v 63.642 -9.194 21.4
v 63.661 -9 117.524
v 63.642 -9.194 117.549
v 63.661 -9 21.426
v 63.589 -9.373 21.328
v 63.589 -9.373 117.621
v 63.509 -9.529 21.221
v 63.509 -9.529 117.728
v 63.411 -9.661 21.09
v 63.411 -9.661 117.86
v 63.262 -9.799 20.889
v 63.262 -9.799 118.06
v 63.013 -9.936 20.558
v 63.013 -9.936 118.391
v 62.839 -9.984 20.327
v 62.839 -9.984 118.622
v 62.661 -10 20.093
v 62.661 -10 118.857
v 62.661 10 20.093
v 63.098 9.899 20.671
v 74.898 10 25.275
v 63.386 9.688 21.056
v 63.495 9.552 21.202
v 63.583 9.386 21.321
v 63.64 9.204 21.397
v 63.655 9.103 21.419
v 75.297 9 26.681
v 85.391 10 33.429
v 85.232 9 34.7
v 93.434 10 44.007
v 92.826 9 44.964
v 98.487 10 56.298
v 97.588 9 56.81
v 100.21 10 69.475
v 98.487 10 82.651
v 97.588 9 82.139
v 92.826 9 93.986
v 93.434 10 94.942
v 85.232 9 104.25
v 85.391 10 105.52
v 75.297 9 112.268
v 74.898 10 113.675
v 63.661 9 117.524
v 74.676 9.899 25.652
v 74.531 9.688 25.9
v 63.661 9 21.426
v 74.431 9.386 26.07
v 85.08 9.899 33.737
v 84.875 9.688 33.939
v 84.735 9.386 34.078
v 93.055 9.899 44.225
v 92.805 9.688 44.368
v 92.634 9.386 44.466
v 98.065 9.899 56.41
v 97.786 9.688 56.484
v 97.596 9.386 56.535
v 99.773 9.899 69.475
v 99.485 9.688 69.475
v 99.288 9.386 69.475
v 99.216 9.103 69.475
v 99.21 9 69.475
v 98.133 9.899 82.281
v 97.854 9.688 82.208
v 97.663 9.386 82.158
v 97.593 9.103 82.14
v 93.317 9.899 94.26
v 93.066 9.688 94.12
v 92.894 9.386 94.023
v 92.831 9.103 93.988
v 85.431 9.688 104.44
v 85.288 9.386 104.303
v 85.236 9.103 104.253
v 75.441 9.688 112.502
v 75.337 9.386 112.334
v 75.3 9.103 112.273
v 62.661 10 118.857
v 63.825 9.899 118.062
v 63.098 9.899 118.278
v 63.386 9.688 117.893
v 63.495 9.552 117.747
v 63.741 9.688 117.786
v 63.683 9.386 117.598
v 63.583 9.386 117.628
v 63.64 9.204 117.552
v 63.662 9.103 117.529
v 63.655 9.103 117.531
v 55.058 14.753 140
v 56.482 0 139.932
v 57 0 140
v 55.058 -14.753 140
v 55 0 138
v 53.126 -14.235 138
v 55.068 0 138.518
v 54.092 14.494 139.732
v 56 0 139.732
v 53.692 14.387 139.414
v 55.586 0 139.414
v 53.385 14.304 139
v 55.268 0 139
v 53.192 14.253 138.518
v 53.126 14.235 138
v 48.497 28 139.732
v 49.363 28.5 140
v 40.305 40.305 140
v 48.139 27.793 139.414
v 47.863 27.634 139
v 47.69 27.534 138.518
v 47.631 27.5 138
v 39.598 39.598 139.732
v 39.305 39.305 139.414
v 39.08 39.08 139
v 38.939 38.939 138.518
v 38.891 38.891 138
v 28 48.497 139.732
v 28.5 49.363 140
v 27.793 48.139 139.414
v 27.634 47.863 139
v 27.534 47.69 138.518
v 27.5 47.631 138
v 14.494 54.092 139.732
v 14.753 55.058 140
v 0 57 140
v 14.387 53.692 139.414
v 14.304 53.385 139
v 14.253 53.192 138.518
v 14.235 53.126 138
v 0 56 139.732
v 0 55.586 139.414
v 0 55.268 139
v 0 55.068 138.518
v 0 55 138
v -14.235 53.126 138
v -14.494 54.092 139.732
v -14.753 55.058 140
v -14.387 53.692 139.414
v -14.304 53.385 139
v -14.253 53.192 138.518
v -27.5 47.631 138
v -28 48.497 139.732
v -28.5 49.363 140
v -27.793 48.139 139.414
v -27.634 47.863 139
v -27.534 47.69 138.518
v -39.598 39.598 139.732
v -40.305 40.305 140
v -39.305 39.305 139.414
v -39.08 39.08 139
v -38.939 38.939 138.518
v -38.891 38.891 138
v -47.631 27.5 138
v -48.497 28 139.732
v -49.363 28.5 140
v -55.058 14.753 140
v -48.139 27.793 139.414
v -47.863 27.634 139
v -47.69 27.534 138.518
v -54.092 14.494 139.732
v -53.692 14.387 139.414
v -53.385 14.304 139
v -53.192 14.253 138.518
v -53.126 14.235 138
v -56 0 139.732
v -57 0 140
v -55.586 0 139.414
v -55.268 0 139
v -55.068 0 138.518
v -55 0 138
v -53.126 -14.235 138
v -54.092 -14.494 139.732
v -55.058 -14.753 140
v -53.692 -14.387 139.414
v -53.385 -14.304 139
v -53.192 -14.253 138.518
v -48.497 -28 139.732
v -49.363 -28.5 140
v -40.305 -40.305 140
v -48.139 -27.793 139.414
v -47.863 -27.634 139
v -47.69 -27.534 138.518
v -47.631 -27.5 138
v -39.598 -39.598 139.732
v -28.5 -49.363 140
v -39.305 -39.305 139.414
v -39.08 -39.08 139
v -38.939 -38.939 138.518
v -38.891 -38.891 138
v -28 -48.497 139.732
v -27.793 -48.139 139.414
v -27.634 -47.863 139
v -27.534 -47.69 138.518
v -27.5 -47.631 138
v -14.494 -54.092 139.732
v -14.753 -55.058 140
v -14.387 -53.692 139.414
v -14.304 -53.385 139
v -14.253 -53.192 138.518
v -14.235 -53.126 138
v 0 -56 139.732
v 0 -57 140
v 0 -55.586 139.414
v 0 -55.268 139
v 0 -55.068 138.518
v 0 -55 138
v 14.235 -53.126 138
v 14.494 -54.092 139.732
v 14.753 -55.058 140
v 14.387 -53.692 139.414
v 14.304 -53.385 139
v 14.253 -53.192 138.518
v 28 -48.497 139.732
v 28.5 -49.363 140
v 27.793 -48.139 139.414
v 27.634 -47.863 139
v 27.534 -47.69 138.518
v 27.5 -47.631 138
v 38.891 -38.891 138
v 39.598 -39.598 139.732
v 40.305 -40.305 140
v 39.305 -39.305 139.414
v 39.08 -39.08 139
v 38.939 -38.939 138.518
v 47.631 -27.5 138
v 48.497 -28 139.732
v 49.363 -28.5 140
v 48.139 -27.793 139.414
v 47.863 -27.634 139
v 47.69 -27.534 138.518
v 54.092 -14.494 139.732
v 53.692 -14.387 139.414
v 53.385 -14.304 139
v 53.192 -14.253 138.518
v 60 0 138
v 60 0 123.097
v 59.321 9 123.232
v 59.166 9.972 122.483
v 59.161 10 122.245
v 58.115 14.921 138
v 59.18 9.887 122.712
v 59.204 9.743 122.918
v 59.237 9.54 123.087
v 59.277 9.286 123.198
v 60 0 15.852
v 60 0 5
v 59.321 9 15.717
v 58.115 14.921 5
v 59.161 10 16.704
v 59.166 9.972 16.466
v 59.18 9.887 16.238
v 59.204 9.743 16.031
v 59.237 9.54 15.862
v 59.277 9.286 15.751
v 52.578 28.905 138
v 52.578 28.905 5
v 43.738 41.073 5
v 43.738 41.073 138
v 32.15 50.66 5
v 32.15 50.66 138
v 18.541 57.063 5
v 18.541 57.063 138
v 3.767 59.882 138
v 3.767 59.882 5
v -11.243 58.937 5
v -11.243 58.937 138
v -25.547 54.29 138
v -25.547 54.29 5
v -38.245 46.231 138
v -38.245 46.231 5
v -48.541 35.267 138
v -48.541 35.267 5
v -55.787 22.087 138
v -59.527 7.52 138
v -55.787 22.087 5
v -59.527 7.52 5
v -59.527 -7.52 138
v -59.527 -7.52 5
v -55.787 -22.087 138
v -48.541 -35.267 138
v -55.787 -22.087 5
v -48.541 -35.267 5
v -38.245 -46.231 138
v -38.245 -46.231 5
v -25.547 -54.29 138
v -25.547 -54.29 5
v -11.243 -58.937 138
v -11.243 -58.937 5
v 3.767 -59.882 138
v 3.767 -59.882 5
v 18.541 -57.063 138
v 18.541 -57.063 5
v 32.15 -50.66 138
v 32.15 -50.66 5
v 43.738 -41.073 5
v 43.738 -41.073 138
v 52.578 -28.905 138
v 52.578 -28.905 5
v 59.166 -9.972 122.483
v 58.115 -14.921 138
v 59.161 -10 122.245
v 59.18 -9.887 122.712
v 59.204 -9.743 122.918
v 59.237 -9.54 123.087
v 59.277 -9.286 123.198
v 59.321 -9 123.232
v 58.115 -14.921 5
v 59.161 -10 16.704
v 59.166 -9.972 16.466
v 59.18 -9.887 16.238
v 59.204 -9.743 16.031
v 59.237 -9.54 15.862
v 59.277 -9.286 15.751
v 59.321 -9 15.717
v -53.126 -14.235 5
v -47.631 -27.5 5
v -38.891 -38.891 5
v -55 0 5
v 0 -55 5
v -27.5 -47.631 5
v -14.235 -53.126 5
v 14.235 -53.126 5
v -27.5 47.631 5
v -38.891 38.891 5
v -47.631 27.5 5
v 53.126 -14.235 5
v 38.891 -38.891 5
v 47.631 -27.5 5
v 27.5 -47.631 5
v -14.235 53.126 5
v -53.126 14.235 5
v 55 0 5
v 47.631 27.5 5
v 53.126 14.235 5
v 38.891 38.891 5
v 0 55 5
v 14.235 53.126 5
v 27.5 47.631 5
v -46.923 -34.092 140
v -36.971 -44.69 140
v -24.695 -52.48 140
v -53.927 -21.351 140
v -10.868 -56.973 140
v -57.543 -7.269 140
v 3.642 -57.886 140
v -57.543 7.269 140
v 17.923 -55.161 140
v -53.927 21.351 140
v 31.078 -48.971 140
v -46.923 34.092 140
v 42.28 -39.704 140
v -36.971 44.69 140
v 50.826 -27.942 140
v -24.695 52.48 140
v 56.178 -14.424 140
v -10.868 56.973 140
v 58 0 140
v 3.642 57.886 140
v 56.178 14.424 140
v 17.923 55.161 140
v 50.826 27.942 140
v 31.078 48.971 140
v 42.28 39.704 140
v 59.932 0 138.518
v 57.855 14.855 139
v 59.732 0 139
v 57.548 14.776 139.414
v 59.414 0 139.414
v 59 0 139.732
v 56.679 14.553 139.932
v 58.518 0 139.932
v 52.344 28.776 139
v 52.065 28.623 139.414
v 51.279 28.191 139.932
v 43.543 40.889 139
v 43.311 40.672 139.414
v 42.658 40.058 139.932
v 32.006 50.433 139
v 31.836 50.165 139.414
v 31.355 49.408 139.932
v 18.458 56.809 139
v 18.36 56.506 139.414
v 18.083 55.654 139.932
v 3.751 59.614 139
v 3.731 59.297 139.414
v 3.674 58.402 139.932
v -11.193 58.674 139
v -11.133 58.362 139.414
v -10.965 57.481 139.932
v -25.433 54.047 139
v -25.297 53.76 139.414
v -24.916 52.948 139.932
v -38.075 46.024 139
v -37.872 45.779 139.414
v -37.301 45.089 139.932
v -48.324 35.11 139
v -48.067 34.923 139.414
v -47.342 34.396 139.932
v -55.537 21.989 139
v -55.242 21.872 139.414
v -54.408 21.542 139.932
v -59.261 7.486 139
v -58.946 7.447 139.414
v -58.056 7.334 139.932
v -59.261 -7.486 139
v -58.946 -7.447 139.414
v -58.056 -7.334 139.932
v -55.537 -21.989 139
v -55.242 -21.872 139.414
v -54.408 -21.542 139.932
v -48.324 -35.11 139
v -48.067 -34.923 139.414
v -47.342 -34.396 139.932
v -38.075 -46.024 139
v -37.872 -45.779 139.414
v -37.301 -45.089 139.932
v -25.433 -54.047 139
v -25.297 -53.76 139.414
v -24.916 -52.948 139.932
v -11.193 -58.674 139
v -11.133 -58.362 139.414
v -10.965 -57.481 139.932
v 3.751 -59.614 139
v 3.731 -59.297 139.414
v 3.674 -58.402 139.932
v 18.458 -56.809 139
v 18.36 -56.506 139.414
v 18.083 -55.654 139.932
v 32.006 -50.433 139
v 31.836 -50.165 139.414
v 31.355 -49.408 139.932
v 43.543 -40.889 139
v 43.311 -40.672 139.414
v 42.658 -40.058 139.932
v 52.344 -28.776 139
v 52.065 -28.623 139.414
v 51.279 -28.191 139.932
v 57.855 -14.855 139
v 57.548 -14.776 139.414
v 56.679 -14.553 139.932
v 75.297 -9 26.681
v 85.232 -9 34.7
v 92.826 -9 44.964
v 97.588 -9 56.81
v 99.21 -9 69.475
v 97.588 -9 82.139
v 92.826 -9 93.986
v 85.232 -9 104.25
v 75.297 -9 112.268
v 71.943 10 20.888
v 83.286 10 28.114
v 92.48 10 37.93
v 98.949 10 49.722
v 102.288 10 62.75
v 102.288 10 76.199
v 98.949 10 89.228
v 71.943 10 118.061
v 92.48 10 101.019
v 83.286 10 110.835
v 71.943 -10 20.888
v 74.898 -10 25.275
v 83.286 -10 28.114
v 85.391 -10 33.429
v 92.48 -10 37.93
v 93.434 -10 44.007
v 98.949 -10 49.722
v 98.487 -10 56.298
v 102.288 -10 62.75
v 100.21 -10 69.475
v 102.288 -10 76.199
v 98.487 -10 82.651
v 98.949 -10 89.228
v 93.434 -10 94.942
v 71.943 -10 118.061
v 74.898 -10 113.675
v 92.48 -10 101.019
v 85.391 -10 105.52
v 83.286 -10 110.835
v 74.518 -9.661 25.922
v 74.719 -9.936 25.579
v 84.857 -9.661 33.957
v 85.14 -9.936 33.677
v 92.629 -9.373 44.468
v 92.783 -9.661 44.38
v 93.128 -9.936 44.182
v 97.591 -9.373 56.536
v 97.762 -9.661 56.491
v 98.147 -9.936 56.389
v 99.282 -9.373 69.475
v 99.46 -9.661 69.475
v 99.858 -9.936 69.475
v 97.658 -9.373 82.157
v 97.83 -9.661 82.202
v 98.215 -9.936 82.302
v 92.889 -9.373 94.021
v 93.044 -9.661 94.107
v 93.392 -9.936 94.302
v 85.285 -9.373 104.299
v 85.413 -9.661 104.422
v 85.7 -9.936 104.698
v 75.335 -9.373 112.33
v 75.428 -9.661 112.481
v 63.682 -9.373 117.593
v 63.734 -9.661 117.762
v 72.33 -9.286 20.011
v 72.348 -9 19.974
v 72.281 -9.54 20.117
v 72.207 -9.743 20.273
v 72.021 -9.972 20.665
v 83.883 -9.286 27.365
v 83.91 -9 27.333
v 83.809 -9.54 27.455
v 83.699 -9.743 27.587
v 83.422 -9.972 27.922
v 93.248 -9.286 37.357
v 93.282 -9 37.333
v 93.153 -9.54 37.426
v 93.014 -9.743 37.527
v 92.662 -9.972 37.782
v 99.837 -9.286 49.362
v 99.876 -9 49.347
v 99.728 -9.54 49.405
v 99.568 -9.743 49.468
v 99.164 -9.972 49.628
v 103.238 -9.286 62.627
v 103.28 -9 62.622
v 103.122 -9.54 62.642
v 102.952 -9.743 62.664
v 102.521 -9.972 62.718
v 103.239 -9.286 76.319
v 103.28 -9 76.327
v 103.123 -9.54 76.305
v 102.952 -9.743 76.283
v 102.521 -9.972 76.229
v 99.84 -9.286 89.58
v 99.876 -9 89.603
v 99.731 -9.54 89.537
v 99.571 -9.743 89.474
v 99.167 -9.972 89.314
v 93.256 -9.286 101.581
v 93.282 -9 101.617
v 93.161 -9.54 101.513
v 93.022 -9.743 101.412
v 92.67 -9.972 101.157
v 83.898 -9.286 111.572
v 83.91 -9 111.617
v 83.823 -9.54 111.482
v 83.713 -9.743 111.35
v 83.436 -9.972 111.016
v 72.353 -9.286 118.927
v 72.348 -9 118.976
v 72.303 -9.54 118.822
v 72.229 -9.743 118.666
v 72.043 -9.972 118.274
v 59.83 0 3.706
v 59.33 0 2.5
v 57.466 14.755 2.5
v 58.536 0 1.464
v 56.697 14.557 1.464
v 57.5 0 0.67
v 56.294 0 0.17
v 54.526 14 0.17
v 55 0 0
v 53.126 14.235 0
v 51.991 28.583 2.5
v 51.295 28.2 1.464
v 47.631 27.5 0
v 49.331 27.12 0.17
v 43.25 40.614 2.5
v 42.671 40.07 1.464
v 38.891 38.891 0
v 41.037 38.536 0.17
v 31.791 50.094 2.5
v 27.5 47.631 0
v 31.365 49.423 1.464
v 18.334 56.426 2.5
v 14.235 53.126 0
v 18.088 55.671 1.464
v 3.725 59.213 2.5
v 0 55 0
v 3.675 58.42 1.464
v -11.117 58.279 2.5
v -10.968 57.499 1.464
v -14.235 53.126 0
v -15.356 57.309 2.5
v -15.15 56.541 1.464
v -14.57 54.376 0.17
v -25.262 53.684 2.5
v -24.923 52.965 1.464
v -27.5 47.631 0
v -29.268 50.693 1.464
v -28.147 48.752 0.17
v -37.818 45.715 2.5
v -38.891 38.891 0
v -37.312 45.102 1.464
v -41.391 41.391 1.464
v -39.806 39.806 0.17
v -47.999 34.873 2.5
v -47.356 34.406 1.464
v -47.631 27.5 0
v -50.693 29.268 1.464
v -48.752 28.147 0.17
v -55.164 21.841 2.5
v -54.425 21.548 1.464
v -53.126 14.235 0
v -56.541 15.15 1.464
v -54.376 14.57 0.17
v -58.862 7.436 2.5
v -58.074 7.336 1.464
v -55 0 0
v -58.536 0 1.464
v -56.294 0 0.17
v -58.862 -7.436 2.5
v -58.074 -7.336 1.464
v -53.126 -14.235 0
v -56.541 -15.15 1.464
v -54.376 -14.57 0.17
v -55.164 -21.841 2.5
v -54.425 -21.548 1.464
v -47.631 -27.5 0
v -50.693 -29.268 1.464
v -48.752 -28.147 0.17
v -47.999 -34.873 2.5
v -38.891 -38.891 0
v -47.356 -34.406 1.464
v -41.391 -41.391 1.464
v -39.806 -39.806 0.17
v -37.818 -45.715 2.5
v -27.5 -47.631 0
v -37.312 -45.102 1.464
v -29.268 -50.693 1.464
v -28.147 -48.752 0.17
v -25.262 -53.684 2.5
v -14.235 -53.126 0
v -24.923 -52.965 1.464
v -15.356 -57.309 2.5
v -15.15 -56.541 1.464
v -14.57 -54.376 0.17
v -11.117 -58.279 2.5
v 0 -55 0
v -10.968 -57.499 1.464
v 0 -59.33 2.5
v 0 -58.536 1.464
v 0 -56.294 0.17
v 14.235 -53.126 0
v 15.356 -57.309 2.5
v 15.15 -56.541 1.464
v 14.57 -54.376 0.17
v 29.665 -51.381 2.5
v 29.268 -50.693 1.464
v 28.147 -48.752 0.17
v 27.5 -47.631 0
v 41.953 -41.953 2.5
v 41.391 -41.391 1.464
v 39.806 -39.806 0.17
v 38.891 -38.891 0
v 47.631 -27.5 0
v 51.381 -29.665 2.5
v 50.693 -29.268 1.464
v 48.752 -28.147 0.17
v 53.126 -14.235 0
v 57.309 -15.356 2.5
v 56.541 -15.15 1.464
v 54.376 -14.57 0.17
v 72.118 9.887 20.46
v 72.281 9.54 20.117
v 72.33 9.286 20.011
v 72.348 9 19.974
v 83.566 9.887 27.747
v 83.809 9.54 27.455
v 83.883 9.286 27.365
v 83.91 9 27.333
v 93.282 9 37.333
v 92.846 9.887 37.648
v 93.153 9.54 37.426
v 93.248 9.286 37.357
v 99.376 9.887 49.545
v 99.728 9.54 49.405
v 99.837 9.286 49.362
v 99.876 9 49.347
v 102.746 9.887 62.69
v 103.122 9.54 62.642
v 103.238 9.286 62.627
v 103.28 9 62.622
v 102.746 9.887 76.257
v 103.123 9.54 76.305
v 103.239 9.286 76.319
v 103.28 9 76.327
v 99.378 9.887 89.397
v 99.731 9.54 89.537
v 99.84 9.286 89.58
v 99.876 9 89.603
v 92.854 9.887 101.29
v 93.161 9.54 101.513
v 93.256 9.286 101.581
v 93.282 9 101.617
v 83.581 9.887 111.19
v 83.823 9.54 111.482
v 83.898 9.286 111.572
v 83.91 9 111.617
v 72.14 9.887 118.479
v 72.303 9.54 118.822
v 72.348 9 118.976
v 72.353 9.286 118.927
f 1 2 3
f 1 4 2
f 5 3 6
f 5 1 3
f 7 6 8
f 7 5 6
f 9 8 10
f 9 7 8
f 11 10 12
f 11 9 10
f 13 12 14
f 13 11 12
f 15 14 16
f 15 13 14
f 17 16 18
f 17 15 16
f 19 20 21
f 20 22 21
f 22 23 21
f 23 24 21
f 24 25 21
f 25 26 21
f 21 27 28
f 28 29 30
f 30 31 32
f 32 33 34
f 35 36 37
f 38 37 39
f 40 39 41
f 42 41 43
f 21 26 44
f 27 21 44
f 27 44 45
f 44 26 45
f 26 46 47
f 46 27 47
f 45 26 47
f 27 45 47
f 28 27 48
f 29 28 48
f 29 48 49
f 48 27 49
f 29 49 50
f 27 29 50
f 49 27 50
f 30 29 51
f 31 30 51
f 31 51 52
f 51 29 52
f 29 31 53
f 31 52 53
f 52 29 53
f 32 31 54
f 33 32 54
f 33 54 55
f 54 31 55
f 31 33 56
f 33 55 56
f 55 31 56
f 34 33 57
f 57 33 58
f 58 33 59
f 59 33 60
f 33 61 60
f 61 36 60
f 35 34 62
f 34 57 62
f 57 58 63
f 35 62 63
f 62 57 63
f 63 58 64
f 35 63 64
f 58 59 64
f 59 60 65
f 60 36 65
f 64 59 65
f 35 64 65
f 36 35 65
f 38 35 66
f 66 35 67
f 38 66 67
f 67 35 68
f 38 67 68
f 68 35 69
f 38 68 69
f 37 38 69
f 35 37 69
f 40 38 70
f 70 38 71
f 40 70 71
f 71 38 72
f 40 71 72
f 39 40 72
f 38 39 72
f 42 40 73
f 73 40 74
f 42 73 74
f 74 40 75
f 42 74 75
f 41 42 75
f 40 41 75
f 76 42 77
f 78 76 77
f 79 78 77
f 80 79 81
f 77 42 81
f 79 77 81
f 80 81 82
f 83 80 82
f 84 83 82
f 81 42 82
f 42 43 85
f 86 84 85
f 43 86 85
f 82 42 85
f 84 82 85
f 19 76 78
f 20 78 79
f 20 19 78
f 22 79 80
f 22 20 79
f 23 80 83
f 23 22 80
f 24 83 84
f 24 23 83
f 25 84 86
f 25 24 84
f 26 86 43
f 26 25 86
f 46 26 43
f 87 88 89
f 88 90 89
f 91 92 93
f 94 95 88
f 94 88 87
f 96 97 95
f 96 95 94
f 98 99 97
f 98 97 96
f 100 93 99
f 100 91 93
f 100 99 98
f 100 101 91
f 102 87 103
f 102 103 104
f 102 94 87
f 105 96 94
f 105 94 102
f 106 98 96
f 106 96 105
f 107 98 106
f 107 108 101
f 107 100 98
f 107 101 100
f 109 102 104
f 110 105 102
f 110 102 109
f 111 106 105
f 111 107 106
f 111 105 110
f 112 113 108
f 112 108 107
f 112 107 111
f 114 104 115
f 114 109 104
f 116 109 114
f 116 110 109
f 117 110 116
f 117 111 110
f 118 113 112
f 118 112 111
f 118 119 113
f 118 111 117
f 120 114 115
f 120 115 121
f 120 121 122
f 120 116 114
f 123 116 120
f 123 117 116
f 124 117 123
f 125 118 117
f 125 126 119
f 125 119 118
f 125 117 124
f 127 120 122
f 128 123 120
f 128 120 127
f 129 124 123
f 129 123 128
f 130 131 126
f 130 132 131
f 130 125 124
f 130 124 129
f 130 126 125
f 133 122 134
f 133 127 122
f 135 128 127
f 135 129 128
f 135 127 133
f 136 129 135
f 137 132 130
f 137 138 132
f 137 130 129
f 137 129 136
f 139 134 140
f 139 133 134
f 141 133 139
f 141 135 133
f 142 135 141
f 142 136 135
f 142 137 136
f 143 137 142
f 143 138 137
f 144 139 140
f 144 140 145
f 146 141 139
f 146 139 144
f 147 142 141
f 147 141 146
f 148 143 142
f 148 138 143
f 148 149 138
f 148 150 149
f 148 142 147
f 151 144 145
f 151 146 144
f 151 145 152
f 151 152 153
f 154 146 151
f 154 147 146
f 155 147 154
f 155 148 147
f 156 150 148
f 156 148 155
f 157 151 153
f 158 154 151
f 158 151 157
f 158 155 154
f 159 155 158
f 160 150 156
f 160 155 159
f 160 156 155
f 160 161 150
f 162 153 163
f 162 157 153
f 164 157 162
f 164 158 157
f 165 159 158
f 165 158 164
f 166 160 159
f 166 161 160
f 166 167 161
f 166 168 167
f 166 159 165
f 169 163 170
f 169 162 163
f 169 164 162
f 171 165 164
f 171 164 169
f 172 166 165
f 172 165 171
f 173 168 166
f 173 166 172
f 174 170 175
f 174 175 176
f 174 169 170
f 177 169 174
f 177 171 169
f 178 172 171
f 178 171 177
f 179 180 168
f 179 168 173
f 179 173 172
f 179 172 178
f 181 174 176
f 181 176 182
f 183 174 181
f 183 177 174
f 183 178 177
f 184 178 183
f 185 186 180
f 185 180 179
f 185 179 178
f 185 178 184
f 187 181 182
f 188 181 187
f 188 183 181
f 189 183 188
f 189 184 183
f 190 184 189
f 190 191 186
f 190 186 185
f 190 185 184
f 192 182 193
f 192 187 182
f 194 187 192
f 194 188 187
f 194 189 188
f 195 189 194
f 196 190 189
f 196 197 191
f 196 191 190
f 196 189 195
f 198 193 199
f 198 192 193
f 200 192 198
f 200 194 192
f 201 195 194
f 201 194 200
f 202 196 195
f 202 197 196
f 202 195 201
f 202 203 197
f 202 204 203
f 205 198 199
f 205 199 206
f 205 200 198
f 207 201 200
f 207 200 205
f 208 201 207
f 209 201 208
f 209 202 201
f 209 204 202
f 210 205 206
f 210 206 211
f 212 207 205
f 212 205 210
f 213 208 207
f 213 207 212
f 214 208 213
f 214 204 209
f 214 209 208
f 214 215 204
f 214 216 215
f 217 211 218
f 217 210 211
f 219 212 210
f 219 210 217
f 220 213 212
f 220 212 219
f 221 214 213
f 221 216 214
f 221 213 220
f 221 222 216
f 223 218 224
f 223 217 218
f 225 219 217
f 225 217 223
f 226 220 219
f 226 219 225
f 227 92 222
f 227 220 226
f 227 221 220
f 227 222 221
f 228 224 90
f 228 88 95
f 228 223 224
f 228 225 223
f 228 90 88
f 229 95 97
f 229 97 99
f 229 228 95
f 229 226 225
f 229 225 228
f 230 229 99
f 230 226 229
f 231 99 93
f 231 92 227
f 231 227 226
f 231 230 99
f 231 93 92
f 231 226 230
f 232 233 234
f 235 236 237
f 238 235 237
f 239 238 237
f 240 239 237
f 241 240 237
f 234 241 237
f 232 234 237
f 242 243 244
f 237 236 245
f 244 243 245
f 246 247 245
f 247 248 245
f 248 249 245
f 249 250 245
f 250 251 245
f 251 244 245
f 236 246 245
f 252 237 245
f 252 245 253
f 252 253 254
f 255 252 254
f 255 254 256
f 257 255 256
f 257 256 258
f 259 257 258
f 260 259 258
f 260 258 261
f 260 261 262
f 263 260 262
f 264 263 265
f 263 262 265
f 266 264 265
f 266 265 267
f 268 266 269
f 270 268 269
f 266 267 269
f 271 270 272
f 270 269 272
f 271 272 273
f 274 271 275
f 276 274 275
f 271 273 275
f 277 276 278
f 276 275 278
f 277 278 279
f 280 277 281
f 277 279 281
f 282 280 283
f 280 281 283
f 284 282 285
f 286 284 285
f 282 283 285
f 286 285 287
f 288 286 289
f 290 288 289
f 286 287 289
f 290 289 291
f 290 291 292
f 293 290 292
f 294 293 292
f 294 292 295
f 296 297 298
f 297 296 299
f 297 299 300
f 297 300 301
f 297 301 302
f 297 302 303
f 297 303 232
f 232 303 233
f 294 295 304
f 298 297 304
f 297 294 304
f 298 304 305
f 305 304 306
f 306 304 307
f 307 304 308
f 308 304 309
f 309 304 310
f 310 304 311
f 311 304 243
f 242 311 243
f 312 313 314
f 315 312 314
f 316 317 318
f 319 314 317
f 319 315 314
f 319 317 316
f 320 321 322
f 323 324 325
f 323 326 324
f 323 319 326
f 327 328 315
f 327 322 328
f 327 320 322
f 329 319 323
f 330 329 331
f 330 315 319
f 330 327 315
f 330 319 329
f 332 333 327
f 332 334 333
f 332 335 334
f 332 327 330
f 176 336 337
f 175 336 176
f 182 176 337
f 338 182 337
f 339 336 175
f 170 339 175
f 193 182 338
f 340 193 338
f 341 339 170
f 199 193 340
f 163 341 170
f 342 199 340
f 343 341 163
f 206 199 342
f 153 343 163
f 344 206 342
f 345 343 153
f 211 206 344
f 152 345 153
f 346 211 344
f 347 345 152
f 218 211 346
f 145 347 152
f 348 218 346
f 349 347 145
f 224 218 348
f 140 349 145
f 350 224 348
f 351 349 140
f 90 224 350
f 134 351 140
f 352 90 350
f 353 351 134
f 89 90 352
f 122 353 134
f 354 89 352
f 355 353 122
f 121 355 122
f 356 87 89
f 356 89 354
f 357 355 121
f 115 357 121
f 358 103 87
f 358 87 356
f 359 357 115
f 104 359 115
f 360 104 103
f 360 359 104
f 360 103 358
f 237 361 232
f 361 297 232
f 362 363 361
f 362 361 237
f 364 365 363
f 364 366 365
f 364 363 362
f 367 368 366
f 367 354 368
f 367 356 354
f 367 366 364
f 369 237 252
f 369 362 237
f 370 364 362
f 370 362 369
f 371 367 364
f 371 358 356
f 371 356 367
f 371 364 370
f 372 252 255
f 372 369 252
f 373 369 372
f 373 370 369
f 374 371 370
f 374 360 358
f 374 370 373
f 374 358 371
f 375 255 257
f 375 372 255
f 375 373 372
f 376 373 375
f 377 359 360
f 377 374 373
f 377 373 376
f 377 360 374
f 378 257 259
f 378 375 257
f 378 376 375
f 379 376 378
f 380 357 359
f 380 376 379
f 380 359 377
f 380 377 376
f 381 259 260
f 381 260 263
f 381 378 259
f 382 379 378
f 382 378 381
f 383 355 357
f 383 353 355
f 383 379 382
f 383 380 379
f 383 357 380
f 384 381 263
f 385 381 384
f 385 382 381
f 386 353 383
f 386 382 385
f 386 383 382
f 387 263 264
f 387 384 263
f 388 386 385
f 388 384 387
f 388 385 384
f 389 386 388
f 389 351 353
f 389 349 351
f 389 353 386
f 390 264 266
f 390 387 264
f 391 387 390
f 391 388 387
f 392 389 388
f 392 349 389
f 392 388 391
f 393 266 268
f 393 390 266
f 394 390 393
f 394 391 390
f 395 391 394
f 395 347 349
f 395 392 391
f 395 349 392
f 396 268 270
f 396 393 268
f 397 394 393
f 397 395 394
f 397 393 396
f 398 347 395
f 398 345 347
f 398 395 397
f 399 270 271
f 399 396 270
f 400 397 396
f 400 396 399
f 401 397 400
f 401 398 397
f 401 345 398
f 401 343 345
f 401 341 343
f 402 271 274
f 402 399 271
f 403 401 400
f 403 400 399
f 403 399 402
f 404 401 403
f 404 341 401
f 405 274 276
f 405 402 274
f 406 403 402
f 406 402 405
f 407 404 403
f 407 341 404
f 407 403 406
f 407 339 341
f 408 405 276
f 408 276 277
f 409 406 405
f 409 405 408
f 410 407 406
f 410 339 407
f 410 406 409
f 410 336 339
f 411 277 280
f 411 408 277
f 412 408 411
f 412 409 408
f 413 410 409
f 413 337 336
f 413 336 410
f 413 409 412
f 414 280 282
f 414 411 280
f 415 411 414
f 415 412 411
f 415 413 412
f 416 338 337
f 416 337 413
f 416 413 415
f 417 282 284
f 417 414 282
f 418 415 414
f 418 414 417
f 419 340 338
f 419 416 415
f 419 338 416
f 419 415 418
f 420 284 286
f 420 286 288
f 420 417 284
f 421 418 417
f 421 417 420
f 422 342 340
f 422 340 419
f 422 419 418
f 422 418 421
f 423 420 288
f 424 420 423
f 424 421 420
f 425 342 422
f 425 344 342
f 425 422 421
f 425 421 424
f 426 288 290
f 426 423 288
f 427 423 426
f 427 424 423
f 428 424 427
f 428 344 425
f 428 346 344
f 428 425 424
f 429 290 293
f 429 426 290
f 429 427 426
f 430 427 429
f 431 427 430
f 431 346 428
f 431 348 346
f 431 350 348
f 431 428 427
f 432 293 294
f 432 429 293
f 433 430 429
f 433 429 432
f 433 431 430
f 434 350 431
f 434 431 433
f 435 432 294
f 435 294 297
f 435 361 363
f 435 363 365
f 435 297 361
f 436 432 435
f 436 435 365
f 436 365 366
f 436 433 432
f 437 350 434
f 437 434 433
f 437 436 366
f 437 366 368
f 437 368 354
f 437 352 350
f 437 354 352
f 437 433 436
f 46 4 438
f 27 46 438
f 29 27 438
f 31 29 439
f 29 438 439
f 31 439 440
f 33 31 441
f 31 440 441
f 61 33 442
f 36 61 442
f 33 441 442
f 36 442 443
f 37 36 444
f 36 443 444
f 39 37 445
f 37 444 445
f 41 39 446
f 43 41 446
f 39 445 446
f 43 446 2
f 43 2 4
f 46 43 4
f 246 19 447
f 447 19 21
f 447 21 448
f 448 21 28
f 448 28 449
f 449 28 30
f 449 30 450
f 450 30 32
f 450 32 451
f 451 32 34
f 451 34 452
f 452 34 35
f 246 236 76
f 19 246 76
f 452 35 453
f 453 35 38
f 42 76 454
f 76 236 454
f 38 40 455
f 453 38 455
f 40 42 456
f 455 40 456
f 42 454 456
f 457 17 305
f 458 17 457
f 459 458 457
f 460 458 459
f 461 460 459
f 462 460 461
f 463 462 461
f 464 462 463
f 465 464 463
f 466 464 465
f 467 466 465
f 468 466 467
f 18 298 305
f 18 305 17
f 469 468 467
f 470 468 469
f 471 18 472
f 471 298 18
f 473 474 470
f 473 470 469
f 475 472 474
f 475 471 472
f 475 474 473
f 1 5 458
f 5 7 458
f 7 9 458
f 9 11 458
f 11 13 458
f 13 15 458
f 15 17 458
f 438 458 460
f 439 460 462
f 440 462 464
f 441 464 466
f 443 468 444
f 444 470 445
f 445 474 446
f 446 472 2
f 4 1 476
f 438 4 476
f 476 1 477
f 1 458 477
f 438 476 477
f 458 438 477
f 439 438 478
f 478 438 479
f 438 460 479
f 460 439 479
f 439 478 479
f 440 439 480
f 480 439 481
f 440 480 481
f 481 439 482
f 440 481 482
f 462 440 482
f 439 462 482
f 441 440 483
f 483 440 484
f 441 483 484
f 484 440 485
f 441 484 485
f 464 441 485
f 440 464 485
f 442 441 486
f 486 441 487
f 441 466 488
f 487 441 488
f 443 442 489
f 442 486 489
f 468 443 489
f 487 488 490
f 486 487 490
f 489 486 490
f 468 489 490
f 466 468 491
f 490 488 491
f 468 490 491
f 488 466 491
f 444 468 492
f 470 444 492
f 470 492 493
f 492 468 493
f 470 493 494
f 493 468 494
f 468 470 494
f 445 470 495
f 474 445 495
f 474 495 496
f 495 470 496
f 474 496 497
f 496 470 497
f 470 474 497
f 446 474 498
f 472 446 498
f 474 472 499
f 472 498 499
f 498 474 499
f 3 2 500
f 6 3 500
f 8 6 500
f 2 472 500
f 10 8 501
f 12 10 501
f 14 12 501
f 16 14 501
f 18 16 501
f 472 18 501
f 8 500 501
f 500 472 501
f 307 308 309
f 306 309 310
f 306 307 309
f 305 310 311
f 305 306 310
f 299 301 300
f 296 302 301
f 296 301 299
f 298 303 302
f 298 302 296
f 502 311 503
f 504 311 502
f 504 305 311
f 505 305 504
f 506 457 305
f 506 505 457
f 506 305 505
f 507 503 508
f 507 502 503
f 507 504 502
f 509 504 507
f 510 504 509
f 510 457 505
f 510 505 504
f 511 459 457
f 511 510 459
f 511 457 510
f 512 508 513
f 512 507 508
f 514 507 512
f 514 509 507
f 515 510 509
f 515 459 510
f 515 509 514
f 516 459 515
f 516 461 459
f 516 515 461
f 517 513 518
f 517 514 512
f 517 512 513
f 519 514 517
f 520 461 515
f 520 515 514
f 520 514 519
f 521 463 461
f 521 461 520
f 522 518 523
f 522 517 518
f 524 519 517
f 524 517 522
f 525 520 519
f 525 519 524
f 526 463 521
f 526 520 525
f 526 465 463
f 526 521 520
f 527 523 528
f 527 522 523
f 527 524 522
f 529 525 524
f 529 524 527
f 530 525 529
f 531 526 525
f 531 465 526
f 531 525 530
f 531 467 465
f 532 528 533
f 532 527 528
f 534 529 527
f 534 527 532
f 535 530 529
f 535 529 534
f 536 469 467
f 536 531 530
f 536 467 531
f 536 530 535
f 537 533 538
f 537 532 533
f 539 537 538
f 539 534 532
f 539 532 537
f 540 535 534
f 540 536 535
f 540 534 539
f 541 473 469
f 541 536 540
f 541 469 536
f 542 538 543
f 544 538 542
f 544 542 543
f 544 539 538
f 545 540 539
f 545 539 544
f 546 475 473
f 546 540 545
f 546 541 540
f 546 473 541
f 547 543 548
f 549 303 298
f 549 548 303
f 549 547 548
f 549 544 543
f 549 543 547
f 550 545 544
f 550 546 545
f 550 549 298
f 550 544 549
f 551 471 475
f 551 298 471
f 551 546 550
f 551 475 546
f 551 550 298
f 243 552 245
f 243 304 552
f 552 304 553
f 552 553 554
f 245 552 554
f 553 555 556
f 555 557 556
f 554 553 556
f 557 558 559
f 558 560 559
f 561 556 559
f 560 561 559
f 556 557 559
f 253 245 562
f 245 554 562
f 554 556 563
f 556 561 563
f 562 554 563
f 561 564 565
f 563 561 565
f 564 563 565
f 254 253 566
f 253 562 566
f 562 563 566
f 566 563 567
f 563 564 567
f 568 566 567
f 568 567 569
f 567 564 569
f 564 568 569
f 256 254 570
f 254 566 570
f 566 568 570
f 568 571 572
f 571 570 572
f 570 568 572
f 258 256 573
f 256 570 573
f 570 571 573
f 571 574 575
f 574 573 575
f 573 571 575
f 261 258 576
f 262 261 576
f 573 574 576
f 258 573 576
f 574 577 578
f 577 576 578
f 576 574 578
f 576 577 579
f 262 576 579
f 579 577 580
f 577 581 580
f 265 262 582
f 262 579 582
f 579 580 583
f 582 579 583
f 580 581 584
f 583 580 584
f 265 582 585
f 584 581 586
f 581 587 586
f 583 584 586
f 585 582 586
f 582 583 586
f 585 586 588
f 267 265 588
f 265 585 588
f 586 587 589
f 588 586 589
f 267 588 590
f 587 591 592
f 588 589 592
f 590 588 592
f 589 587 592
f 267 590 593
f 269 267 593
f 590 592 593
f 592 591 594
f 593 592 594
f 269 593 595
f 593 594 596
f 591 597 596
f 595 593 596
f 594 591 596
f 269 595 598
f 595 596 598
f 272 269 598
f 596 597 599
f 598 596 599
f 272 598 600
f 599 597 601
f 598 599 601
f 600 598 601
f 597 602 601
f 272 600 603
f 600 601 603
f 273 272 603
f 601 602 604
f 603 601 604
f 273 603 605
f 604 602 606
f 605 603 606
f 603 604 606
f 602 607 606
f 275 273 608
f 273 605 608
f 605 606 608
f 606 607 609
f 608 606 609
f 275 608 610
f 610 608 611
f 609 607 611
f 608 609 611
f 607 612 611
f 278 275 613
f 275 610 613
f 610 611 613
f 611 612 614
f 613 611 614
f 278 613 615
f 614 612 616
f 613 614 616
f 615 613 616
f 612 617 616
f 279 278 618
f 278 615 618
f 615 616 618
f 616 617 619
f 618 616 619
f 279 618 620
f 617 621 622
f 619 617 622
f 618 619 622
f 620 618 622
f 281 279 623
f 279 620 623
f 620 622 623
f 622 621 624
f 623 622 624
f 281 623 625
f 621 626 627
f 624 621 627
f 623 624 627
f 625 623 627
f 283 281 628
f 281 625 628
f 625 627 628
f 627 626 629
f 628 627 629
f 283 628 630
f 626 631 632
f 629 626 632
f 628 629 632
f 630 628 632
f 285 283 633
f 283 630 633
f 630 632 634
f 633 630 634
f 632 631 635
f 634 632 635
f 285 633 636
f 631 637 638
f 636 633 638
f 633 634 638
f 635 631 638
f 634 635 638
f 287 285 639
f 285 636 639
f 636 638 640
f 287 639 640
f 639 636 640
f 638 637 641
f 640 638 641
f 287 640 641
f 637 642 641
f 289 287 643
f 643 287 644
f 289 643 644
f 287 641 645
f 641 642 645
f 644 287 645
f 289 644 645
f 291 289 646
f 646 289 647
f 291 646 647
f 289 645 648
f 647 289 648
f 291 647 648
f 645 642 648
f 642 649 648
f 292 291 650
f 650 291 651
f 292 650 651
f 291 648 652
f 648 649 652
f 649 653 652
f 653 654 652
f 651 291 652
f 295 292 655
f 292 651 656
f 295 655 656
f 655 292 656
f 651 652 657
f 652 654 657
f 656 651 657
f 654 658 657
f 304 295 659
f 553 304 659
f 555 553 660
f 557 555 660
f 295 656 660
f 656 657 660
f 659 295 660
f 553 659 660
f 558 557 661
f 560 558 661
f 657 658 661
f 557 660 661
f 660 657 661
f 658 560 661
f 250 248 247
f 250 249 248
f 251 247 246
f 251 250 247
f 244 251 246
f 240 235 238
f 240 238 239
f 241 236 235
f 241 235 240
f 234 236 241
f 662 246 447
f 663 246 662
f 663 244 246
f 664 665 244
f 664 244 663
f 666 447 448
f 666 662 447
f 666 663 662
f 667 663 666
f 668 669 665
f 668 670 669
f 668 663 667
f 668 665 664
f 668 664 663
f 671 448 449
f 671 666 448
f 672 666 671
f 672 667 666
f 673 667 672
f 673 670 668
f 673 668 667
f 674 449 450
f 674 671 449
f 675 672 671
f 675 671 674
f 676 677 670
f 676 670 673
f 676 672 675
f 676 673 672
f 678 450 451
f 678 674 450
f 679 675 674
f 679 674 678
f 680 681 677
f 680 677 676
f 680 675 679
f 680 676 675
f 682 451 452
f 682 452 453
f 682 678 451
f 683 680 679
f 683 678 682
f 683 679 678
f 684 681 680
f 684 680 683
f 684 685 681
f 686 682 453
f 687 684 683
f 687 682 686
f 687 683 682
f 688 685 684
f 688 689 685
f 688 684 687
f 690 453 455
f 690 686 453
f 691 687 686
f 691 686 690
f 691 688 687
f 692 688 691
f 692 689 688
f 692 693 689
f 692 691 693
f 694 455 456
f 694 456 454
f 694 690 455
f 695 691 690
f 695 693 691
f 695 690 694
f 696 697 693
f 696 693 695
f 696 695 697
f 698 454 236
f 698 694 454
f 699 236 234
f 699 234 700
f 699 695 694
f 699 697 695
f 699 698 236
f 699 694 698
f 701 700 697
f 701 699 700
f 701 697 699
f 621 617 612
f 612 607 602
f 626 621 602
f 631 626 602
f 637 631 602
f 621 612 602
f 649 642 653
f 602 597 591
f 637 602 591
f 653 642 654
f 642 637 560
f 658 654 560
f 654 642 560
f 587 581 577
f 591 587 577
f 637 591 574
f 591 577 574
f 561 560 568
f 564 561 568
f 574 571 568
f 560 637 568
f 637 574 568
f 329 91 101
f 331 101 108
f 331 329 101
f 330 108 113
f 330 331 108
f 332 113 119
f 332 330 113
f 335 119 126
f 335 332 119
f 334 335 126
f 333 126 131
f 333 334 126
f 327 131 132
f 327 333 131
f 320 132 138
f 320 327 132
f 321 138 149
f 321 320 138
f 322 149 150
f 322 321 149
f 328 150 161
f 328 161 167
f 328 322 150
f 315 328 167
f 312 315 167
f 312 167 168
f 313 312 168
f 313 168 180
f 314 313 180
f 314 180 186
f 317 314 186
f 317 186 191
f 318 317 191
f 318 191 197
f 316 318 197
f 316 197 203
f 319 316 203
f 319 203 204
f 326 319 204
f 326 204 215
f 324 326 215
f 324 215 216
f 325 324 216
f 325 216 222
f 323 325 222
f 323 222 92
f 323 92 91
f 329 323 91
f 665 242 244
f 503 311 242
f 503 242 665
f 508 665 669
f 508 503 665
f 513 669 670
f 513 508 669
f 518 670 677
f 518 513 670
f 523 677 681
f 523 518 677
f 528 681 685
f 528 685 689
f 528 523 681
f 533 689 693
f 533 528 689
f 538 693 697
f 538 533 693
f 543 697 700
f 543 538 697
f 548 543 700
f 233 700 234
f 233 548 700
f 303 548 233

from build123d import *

# Parameters (mm, degrees)
F0_R     = 60
F1_DEPTH = 140
F2_T     = -5
F3_R     = 2
F5_DEPTH = 10
F7_DEPTH = 54
F8_R     = 1
F9_R     = 5


with BuildPart() as f1:
    # F0 (on Top) → F1 (new body)
    with BuildSketch(Plane.XY):
        Circle(F0_R)
    extrude(amount=F1_DEPTH)

    # F2
    f2_openings = [f1.faces().sort_by_distance(p)[0] for p in [
        (0, 0, 140),
    ]]
    offset(amount=F2_T, openings=f2_openings)

    # F3
    f3_edges = [f1.edges().sort_by_distance(p)[0] for p in [
        (-55, 0, 140),
        (-60, 0, 140),
    ]]
    fillet(f3_edges, radius=F3_R)

    # F4 (on Front) → F5 (join, symmetric)
    with BuildSketch(Plane.XZ):
        with BuildLine():
            Line((57.7629804611, 123.5093176365), (57.7629804611, 15.4400020838))
            ThreePointArc((57.7629804611, 15.4400020838), (103.710291096, 69.4746598601), (57.7629804611, 123.5093176365))
        make_face()
    extrude(amount=F5_DEPTH, both=True)

    # F6 (on face) → F7 (cut)
    with BuildSketch(Plane.XZ.offset(10)):
        with BuildLine():
            Line((63.660797831, 117.5236095815), (63.660797831, 21.4257101387))
            ThreePointArc((63.660797831, 21.4257101387), (99.210291096, 69.4746598601), (63.660797831, 117.5236095815))
        make_face()
    extrude(amount=-F7_DEPTH, mode=Mode.SUBTRACT)

    # F8
    f8_edges = [f1.edges().sort_by_distance(p)[0] for p in [
        (99.210291, -10, 69.47466),
        (63.660798, -10, 69.47466),
        (63.660798, 10, 69.47466),
        (99.210291, 10, 69.47466),
        (103.710291, 10, 69.47466),
        (103.710291, -10, 69.47466),
    ]]
    fillet(f8_edges, radius=F8_R)

    # F9
    f9_edges = [f1.edges().sort_by_distance(p)[0] for p in [
        (-60, 0, 0),
    ]]
    fillet(f9_edges, radius=F9_R)


solid = f1.part
